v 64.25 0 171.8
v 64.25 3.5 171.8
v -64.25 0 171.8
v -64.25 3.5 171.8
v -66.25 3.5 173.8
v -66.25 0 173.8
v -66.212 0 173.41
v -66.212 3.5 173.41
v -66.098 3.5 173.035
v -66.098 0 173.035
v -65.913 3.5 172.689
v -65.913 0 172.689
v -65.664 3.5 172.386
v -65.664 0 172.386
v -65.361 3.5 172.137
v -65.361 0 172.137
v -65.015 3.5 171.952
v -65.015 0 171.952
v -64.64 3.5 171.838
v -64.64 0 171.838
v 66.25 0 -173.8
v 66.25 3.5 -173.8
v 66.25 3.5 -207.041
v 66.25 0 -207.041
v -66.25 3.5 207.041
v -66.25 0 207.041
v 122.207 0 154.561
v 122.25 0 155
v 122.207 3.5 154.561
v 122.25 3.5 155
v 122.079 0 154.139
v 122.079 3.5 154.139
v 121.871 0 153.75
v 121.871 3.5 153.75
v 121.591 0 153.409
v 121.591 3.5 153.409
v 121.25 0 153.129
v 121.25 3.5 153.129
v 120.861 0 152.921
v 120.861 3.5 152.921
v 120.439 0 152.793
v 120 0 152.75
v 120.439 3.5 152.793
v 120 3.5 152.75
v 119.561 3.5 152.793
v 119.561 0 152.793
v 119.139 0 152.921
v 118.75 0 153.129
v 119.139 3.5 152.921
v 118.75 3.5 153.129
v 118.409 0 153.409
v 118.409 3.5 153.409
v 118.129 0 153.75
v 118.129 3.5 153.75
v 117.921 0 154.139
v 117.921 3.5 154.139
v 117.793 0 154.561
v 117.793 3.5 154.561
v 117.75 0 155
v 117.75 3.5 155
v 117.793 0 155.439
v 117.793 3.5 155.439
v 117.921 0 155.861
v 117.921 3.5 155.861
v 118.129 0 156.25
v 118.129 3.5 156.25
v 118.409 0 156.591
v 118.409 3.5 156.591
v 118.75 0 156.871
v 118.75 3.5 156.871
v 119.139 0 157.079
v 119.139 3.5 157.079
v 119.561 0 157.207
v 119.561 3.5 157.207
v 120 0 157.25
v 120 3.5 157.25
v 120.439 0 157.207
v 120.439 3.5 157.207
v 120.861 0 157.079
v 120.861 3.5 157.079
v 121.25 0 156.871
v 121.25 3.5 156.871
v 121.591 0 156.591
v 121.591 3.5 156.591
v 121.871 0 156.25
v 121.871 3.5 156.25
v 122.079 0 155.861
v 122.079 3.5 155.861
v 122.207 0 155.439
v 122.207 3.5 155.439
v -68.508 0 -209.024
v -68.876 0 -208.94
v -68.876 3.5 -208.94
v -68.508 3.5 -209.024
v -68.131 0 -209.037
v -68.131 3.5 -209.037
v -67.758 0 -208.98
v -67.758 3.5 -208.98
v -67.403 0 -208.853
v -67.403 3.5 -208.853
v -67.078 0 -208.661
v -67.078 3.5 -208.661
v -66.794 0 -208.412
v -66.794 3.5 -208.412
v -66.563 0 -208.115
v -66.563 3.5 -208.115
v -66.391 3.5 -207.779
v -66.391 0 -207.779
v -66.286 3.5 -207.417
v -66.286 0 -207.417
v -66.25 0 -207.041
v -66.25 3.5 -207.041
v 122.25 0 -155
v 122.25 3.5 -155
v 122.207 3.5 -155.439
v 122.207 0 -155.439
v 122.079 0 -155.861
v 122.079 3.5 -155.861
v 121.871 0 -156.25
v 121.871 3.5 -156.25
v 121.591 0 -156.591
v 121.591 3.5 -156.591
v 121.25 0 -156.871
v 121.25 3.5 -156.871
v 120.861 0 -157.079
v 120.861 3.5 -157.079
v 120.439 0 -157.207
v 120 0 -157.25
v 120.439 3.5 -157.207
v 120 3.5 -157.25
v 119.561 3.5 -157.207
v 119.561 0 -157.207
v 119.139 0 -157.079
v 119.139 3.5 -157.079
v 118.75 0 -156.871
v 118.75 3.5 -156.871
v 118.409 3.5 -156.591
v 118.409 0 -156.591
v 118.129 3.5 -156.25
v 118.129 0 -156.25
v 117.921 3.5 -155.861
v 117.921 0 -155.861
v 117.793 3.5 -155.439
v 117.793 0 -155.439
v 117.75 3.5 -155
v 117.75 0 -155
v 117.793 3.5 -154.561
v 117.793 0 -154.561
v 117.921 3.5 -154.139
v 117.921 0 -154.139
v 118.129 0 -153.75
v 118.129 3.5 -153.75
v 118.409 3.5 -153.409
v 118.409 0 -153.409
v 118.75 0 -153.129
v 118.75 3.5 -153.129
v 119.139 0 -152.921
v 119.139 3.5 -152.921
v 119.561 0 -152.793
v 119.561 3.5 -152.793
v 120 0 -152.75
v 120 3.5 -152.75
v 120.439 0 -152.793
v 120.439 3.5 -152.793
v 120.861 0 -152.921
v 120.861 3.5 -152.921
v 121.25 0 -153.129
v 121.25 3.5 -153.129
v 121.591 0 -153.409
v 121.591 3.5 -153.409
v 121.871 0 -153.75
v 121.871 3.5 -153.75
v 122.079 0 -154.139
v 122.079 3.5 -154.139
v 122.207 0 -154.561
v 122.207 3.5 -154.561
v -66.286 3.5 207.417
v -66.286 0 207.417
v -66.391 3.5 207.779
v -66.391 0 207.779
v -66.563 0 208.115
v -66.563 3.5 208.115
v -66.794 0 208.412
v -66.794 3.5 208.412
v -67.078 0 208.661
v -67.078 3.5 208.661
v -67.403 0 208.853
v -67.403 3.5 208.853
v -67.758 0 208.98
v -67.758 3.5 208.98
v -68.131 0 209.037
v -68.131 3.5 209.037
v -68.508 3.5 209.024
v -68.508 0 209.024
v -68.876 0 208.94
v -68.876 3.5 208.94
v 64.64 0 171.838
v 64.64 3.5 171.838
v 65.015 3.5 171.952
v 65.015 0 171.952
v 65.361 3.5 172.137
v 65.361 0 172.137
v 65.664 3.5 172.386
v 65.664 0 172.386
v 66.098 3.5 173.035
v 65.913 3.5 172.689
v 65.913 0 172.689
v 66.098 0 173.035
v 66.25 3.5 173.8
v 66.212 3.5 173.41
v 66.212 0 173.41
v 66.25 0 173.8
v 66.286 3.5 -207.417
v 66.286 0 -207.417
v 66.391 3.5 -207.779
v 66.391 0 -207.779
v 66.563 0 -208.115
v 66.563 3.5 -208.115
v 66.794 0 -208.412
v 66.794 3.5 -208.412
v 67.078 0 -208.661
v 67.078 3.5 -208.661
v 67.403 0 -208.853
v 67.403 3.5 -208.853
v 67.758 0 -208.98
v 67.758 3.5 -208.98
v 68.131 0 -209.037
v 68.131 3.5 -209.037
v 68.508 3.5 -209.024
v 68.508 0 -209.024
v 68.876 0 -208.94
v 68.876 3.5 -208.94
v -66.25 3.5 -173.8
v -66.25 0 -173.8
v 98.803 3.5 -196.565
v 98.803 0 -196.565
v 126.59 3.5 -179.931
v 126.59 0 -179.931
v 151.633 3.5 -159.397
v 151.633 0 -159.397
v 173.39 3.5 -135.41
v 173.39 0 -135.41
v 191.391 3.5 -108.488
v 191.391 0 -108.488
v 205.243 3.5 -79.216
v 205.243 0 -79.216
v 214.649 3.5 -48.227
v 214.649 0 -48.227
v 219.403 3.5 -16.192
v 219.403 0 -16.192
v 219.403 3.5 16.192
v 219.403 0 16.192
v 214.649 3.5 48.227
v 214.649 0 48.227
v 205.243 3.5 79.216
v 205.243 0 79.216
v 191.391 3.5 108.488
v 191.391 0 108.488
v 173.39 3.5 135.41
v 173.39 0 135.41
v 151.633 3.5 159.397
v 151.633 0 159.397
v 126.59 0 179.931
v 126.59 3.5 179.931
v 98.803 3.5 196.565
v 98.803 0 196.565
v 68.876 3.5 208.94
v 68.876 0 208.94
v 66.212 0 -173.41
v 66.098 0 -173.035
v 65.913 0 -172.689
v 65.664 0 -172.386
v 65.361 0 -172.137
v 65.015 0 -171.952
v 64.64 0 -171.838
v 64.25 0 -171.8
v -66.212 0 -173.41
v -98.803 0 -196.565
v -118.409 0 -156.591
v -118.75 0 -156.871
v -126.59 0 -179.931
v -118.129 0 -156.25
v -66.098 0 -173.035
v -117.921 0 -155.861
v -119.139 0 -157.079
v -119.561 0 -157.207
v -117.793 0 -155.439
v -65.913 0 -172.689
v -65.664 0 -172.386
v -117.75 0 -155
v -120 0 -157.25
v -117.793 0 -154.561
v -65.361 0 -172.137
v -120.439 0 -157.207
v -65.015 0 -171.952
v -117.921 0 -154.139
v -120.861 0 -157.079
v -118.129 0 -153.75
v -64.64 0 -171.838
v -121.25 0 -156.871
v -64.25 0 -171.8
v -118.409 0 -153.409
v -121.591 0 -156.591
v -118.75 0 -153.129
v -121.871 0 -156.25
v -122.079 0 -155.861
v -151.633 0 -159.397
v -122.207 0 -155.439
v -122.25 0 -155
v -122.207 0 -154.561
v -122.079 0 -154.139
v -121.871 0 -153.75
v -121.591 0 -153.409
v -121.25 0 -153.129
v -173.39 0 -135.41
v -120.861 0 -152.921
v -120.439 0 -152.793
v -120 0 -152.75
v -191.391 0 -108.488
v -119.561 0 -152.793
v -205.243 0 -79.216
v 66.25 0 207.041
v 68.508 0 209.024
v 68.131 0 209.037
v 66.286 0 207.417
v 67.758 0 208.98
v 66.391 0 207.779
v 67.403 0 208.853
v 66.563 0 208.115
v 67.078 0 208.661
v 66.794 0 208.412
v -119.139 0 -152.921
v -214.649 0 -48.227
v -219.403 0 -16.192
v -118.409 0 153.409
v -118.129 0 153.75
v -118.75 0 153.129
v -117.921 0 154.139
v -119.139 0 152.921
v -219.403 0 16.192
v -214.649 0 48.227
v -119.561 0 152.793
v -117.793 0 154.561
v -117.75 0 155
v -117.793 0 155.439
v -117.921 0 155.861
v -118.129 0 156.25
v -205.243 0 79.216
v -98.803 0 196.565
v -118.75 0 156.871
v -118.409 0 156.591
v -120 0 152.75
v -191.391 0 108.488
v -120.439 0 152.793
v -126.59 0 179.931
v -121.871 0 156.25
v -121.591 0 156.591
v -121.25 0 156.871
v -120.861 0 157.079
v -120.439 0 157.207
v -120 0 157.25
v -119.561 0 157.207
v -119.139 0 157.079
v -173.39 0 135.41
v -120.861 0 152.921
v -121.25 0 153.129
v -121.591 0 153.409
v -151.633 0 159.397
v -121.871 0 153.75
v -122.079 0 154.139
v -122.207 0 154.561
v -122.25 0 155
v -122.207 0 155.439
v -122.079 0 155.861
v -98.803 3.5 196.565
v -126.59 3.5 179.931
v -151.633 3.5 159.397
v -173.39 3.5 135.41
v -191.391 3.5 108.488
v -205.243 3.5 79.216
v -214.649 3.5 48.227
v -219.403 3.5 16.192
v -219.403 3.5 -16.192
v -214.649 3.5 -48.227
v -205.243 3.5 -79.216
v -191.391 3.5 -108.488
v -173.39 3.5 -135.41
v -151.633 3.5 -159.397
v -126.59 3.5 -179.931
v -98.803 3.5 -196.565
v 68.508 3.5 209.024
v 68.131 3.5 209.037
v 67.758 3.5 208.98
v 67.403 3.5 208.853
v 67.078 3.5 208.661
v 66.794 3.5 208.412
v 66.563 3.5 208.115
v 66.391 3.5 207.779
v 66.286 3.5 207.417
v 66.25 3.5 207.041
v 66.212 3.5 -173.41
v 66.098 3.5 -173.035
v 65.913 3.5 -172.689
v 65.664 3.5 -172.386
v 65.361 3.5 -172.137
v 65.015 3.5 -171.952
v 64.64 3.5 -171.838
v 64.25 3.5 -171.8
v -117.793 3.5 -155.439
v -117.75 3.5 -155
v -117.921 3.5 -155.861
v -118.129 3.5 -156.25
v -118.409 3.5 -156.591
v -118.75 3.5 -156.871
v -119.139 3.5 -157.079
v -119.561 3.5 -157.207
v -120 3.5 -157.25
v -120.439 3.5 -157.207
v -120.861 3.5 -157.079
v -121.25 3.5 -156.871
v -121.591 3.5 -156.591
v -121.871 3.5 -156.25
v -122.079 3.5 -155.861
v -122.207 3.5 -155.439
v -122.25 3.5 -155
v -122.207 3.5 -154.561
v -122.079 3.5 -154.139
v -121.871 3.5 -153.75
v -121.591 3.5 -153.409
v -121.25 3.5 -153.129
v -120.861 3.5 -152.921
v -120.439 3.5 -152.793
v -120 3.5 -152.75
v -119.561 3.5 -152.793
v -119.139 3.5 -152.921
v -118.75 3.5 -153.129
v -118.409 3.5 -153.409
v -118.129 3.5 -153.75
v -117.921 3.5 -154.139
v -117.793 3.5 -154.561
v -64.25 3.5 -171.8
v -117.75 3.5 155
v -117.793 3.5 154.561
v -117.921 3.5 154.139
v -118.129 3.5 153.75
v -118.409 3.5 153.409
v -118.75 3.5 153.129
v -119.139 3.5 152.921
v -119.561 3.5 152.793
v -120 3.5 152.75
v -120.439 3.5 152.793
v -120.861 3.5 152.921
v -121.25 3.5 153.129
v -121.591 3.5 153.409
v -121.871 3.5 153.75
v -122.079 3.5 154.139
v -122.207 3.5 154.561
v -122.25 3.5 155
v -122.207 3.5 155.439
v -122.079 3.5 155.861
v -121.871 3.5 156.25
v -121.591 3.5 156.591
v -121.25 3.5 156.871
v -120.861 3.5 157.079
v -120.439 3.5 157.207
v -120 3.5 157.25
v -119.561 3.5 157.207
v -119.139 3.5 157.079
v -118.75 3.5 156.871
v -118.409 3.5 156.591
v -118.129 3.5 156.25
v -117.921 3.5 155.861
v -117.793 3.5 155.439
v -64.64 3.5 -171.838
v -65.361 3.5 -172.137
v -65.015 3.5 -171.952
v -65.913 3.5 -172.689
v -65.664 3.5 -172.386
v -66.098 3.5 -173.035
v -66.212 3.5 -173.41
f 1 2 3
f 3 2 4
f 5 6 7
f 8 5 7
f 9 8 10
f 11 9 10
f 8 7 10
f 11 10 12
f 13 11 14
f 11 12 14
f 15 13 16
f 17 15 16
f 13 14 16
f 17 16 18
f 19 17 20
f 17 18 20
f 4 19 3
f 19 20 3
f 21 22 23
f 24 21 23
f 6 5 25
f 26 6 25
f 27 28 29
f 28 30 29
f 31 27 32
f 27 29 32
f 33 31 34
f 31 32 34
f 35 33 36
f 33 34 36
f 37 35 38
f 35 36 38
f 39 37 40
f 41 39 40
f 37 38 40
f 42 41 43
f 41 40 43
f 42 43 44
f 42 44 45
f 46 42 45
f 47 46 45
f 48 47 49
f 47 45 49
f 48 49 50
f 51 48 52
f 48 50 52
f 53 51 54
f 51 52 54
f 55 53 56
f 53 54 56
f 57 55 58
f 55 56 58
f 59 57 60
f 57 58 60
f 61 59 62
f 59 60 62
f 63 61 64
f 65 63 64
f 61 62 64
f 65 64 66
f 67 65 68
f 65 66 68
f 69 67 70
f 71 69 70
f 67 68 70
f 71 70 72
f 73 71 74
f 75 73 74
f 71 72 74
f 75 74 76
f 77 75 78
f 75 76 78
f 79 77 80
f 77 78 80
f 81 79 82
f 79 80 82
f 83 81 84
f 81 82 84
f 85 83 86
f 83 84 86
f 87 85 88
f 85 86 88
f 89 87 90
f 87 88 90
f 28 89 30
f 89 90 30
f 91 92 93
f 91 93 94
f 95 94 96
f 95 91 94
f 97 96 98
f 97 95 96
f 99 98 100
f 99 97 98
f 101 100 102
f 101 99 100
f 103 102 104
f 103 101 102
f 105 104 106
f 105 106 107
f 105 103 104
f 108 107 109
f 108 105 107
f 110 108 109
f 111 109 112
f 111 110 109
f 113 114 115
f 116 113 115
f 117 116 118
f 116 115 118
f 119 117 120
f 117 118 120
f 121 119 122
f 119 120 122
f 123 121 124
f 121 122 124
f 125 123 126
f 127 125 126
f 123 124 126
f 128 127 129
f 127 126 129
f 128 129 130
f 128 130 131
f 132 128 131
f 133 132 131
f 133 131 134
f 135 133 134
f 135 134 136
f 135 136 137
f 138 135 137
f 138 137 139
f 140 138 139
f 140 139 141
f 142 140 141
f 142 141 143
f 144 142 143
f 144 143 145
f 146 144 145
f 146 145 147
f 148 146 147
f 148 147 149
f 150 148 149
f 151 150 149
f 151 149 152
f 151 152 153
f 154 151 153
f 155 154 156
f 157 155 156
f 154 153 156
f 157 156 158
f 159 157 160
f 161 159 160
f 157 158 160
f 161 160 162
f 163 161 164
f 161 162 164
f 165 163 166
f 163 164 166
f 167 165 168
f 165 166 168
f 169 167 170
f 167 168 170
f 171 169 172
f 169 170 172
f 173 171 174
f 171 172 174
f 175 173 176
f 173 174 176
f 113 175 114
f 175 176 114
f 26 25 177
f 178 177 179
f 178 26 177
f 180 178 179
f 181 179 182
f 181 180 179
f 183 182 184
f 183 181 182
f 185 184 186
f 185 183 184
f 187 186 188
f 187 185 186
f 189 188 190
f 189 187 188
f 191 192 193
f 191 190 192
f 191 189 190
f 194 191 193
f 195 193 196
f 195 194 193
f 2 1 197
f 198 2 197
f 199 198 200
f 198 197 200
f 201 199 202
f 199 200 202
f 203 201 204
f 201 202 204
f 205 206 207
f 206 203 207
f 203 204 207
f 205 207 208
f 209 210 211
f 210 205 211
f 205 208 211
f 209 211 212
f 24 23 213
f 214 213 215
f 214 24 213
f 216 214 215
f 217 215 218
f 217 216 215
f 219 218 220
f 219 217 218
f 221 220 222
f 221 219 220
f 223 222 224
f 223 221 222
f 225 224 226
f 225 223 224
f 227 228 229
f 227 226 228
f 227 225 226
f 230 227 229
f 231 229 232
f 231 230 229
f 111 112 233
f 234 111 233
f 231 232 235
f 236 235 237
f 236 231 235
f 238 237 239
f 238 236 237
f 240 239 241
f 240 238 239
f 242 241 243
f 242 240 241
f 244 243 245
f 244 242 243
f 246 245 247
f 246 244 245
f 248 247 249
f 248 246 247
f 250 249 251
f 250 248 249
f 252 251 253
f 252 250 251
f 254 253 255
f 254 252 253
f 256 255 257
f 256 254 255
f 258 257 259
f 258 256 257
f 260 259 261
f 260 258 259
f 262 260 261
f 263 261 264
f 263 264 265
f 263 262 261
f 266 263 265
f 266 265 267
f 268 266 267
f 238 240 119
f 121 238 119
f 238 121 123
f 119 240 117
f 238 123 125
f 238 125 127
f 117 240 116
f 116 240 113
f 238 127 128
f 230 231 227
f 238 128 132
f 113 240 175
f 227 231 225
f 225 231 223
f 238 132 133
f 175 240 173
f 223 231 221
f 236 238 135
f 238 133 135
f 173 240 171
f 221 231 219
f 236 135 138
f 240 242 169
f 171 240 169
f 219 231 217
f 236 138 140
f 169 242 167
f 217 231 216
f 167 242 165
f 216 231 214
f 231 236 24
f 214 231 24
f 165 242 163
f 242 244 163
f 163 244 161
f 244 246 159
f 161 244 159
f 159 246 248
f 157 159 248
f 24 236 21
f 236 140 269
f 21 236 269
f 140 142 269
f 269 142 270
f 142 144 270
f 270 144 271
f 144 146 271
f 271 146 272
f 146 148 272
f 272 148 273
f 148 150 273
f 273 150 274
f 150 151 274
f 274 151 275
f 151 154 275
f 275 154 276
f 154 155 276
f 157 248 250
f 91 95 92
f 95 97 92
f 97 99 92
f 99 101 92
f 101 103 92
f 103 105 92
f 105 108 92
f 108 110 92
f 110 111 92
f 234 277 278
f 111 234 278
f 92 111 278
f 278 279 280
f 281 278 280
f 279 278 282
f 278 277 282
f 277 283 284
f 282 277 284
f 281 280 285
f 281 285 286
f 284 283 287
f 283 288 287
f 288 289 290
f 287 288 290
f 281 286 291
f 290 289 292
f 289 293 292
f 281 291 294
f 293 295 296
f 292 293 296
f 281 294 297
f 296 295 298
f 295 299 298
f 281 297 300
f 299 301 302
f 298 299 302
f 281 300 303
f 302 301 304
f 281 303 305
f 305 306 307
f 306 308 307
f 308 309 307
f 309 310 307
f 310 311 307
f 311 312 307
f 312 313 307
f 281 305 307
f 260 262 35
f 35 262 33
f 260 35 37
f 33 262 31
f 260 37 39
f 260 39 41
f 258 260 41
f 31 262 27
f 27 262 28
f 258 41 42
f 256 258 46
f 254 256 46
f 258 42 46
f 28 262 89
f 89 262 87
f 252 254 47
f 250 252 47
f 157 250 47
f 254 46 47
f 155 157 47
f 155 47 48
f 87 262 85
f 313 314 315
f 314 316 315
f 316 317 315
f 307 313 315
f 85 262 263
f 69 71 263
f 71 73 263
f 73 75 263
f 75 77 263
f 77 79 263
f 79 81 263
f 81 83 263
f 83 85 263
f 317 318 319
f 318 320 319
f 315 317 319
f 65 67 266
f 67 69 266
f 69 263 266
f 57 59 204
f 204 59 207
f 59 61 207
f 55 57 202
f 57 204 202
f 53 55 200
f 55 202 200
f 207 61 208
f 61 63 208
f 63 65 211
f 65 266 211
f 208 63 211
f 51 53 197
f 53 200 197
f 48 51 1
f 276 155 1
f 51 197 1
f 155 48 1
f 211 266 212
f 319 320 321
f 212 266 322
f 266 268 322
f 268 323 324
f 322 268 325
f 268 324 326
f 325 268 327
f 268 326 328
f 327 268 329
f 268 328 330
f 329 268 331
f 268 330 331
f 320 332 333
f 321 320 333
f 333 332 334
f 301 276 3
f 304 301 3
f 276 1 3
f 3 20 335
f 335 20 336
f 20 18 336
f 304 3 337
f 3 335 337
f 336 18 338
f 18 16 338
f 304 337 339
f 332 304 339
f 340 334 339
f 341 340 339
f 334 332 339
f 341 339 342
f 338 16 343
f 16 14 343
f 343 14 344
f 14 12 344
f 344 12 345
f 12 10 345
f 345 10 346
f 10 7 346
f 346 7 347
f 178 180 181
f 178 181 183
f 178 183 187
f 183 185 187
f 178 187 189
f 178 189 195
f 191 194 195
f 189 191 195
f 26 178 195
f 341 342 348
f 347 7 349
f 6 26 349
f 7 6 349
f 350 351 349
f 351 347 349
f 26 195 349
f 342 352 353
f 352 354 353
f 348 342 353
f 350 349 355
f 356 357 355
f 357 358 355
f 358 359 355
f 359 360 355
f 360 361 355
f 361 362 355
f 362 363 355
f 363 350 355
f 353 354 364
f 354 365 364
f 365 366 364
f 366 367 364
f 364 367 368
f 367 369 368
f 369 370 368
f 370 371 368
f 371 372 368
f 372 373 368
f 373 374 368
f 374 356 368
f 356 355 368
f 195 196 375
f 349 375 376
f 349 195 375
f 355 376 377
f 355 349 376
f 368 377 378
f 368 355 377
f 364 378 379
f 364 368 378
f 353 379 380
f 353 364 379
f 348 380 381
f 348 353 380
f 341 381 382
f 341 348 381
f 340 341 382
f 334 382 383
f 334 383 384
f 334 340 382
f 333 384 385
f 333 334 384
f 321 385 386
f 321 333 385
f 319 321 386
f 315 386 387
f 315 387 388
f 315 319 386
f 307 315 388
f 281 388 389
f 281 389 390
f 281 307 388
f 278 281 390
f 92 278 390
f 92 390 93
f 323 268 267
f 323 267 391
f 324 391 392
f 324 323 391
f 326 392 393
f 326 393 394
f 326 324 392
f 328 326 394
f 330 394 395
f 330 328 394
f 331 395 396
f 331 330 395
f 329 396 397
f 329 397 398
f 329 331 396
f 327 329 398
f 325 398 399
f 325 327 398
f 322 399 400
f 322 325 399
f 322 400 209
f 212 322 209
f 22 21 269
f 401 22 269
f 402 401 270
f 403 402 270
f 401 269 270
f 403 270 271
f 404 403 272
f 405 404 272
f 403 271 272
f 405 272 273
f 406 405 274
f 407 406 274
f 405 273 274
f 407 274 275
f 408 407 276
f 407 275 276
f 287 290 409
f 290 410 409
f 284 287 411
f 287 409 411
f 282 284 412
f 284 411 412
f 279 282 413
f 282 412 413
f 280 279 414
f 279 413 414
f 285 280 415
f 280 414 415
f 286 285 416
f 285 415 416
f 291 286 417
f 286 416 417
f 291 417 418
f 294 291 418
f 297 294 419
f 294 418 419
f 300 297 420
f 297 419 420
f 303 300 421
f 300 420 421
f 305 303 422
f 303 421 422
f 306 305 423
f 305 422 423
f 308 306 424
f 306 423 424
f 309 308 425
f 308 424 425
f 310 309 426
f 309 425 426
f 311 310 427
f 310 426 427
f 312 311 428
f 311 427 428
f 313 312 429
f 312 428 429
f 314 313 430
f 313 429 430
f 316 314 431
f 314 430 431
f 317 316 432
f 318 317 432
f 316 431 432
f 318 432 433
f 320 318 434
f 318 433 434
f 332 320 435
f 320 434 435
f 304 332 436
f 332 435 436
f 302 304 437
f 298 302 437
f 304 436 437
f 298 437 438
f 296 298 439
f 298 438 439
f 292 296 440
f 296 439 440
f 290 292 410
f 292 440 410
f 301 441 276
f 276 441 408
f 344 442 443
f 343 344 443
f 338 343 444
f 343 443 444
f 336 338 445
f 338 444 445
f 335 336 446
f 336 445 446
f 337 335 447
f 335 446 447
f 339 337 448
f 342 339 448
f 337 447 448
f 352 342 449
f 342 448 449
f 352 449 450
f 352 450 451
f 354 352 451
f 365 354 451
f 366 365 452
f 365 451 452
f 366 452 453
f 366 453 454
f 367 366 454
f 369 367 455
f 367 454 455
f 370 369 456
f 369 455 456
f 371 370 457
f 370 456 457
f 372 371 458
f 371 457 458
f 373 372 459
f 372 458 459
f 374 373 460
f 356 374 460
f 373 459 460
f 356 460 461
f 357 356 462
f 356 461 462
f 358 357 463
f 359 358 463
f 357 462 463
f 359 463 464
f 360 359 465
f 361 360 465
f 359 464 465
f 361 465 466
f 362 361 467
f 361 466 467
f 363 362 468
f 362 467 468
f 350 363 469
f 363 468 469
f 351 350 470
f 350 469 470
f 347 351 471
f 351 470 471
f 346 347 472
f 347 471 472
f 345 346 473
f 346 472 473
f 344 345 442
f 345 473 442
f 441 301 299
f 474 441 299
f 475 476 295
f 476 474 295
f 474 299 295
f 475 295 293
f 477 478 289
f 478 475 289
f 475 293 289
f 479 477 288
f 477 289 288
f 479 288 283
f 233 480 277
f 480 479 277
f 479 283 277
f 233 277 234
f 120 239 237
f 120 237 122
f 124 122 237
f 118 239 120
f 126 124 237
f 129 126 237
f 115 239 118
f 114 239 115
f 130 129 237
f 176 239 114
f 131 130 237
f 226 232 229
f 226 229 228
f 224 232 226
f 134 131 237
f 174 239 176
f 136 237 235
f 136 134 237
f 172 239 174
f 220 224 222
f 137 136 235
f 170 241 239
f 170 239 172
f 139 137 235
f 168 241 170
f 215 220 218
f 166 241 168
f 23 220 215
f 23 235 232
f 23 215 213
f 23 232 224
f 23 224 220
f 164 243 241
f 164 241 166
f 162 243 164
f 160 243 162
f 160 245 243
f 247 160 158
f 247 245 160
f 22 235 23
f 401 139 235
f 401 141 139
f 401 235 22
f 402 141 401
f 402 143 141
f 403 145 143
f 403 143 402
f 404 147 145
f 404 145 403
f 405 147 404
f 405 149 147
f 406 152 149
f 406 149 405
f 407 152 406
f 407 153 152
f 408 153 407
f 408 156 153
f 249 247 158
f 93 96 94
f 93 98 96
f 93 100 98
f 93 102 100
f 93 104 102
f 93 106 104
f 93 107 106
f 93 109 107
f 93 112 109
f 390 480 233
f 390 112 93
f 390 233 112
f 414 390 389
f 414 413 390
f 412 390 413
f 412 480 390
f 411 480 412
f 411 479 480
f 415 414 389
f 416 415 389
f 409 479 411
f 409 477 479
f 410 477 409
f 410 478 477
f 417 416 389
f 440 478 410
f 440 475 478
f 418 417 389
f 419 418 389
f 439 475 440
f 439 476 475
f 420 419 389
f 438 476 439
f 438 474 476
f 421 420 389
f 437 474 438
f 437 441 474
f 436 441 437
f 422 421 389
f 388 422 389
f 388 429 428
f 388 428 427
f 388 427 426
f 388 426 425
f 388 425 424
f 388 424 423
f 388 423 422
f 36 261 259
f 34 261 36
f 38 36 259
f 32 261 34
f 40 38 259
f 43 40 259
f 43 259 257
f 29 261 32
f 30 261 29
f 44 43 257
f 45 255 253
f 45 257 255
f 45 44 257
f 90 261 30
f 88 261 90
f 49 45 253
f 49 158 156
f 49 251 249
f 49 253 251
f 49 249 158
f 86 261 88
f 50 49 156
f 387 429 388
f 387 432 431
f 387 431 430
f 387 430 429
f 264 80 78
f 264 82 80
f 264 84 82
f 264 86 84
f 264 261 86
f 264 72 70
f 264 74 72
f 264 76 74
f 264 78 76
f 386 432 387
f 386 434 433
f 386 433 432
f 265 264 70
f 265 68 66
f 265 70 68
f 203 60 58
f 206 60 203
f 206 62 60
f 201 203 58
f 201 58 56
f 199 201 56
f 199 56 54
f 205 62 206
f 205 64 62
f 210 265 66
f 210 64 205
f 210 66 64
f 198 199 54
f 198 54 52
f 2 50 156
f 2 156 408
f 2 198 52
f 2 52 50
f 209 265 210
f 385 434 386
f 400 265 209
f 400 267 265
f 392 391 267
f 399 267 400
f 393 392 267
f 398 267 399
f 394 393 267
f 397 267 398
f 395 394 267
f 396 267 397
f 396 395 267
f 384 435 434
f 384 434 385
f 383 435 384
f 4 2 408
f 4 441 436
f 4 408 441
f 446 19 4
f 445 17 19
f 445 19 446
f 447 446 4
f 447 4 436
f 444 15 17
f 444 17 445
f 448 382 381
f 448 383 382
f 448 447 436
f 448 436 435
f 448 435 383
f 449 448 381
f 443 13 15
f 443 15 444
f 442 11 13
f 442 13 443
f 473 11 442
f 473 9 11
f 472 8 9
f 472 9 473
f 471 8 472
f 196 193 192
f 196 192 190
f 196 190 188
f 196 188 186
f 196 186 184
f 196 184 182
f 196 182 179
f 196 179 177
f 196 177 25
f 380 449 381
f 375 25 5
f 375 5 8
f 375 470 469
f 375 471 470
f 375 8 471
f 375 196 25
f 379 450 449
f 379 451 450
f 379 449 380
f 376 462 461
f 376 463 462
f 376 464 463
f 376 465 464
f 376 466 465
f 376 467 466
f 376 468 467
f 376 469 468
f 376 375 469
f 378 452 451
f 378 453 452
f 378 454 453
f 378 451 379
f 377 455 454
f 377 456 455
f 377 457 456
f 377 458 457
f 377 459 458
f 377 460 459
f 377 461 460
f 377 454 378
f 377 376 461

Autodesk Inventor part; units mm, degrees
ref_plane "YZ Plane" through (0, 0, 0) normal (1, 0, 0) x (0, 1, 0)
ref_plane "XZ Plane" through (0, 0, 0) normal (0, 1, 0) x (-1, 0, 0)
ref_plane "XY Plane" through (0, 0, 0) normal (0, 0, 1) x (1, 0, 0)
sketch "Sketch1" plane through (0, 0, 0) normal (0, 1, 0) x (-1, 0, 0)
  circle A0 centre (0, 0) radius 220
  dimension "d0" = 440
extrude "Extrusion1" add sketch "Sketch1" along normal blind 3.5
sketch "Sketch2" plane through (0, 3.5, 0) normal (0, 1, 0) x (1, 0, 0)
  line L0 (-66.25, 171.8) -> (66.25, 171.8)
  line L1 (66.25, 171.8) -> (66.25, 220)
  line L2 (66.25, 220) -> (-66.25, 220)
  line L3 (-66.25, 220) -> (-66.25, 171.8)
  circle A0 centre (0, 0) radius 220 projected
  point P0 (0, 220)
  dimension "d3" = 132.5
  dimension "d4" = 48.2
  dimension "d5" = 0
  dimension "d6" = 220
extrude "Extrusion2" cut sketch "Sketch2" against normal through all contours L3 A0 L1 L0 | L3 L2 A0 | A0 L2 L1 picked at (0, 187.8667)
fillet "Fillet1" radius 2 4 edges at (-66.25, 1.75, -171.8) (-66.25, 1.75, -209.7878) (66.25, 1.75, -209.7878) (66.25, 1.75, -171.8)
mirror "Mirror1" about plane through (0, 0, 0) normal (0, 0, 1) of "Extrusion2", "Fillet1"
sketch "Sketch3" plane through (0, 3.5, 0) normal (0, 1, 0) x (1, 0, 0)
  line L0 (0, 0) -> (-120, 0)
  line L1 (-120, 0) -> (-120, 155)
  circle A0 centre (-120, 155) radius 2.25
  circle A1 centre (120, 155) radius 2.25
  circle A2 centre (-120, -155) radius 2.25
  circle A3 centre (120, -155) radius 2.25
  dimension "d10" = 120
  dimension "d11" = 155
  dimension "d12" = 4.5
  dimension "d15" = 240
  dimension "d18" = 310
extrude "Extrusion3" cut sketch "Sketch3" against normal blind 10
properties part number "AMR_base" material "Aluminum 6061"
